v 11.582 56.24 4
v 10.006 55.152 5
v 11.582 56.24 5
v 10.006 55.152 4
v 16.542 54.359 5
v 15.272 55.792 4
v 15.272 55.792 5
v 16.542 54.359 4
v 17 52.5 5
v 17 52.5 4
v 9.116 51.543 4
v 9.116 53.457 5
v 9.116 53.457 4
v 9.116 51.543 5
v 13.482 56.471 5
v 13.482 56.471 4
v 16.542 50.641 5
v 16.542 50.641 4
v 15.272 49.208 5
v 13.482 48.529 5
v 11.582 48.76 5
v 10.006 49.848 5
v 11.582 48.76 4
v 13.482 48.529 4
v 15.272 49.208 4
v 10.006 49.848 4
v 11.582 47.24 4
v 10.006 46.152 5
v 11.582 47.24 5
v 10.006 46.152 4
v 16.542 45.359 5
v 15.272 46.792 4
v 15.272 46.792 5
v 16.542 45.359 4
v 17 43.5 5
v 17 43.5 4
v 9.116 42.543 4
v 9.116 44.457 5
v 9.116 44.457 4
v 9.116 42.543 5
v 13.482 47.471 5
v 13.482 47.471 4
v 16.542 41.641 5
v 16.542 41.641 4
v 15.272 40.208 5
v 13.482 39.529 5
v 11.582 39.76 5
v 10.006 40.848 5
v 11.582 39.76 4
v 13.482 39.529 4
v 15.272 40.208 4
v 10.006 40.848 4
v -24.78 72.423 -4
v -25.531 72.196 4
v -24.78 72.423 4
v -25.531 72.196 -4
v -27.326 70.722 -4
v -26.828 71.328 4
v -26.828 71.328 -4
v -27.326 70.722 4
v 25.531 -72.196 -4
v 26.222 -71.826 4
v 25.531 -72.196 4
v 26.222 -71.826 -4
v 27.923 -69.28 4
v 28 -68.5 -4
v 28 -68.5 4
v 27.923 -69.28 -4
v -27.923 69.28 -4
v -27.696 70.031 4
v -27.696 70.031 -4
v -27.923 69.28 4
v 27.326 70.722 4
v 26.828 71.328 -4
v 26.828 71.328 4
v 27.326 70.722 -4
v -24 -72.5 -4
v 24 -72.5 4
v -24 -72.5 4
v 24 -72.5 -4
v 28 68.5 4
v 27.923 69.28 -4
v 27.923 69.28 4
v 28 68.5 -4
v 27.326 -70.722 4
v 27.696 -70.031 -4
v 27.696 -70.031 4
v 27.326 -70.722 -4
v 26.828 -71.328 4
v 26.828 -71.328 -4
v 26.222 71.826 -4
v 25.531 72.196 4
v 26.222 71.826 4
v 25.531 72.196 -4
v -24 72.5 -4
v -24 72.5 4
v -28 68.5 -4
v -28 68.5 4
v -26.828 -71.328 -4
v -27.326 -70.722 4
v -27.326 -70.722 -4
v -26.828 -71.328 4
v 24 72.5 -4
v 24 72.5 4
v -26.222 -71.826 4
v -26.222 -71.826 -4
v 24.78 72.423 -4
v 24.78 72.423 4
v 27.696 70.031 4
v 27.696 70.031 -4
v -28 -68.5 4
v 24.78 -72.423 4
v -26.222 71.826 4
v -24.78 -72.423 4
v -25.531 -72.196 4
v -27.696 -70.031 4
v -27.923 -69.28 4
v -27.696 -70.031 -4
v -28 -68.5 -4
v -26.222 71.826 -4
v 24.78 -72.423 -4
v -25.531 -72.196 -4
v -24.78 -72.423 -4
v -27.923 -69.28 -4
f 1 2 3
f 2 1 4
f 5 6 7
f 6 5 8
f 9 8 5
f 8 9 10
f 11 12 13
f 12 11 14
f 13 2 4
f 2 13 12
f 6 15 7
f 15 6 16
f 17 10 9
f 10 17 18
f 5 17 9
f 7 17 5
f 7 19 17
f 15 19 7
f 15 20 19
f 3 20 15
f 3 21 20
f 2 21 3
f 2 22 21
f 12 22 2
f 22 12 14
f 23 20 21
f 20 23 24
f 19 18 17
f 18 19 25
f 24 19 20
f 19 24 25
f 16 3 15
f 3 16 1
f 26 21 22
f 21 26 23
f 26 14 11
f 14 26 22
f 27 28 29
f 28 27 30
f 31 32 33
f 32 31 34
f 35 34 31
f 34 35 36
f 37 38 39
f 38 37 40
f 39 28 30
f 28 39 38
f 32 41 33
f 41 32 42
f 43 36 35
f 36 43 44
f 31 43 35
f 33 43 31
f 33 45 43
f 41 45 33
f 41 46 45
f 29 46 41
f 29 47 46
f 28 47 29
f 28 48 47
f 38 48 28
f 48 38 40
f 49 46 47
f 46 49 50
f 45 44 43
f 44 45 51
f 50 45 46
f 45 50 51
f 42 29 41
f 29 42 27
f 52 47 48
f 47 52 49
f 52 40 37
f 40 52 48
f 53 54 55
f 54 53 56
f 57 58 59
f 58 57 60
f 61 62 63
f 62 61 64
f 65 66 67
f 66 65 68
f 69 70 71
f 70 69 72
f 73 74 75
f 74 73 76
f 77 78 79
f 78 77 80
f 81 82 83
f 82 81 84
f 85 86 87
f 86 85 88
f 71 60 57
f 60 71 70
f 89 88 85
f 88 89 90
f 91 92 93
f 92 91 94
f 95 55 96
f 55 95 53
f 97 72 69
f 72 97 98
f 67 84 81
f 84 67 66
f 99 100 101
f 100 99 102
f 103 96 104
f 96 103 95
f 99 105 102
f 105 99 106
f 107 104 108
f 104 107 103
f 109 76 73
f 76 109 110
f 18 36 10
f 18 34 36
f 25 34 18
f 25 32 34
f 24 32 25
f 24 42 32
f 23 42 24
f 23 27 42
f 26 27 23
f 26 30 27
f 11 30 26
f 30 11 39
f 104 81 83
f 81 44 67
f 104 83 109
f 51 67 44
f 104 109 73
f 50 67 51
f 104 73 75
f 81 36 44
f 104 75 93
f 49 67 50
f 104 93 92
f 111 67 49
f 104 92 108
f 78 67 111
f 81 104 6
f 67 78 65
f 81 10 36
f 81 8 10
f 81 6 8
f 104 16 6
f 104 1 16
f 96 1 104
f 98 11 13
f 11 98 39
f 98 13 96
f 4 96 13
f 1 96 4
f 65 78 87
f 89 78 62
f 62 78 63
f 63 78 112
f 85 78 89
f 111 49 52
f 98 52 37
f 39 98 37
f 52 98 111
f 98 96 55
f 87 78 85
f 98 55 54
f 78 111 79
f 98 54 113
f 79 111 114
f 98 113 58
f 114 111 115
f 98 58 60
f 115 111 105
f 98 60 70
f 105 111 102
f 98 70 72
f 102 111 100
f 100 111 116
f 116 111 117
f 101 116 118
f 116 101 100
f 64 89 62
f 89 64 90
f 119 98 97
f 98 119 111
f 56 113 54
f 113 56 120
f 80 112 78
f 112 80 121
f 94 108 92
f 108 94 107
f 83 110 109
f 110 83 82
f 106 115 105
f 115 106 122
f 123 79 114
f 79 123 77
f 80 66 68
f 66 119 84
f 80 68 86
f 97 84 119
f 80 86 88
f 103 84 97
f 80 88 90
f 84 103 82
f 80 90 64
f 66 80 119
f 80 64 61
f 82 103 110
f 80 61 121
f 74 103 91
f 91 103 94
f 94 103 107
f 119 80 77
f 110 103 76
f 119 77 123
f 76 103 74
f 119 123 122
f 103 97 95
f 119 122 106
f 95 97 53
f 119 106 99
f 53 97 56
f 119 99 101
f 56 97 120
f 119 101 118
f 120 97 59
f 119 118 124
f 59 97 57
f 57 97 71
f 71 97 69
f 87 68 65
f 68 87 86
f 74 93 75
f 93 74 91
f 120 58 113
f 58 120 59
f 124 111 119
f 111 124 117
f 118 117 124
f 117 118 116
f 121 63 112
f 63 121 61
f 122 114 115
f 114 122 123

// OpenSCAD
echo("Работа Павла Поздеева");
len_phone = 145;
width_phone = 56;
thickness_phone = 8;
corner_round = 8;

//color("red")
//translate([0, 0, 10])
//cube([width_phone, len_phone, thickness_phone], center=true);

smartphone();

module smartphone() {
    smartphone_block();
    cameras_block();
}

module cameras_block() {
    color("blue")
    translate([width_phone/2 - 15, len_phone/2 - 20, 0])
        cylinder(d=8, h = thickness_phone/2 + 1);

    color("blue")
    translate([width_phone/2 - 15, len_phone/2 - 29, 0])
        cylinder(d=8, h = thickness_phone/2 + 1);
}

module smartphone_block() {
    hull() {
        translate([width_phone/2 - corner_round/2, len_phone/2 - corner_round/2, 0])
            cylinder(h=thickness_phone, d=corner_round, $fn=32, center=true);

        mirror([1, 0, 0])
        translate([width_phone/2 - corner_round/2, len_phone/2 - corner_round/2, 0])
            cylinder(h=thickness_phone, d=corner_round, $fn=32, center=true);

        mirror([0, 1, 0])
        translate([width_phone/2 - corner_round/2, len_phone/2 - corner_round/2, 0])
            cylinder(h=thickness_phone, d=corner_round, $fn=32, center=true);

        mirror([1, 0, 0])
        mirror([0, 1, 0])
        translate([width_phone/2 - corner_round/2, len_phone/2 - corner_round/2, 0])
            cylinder(h=thickness_phone, d=corner_round, $fn=32, center=true);
    }
}
